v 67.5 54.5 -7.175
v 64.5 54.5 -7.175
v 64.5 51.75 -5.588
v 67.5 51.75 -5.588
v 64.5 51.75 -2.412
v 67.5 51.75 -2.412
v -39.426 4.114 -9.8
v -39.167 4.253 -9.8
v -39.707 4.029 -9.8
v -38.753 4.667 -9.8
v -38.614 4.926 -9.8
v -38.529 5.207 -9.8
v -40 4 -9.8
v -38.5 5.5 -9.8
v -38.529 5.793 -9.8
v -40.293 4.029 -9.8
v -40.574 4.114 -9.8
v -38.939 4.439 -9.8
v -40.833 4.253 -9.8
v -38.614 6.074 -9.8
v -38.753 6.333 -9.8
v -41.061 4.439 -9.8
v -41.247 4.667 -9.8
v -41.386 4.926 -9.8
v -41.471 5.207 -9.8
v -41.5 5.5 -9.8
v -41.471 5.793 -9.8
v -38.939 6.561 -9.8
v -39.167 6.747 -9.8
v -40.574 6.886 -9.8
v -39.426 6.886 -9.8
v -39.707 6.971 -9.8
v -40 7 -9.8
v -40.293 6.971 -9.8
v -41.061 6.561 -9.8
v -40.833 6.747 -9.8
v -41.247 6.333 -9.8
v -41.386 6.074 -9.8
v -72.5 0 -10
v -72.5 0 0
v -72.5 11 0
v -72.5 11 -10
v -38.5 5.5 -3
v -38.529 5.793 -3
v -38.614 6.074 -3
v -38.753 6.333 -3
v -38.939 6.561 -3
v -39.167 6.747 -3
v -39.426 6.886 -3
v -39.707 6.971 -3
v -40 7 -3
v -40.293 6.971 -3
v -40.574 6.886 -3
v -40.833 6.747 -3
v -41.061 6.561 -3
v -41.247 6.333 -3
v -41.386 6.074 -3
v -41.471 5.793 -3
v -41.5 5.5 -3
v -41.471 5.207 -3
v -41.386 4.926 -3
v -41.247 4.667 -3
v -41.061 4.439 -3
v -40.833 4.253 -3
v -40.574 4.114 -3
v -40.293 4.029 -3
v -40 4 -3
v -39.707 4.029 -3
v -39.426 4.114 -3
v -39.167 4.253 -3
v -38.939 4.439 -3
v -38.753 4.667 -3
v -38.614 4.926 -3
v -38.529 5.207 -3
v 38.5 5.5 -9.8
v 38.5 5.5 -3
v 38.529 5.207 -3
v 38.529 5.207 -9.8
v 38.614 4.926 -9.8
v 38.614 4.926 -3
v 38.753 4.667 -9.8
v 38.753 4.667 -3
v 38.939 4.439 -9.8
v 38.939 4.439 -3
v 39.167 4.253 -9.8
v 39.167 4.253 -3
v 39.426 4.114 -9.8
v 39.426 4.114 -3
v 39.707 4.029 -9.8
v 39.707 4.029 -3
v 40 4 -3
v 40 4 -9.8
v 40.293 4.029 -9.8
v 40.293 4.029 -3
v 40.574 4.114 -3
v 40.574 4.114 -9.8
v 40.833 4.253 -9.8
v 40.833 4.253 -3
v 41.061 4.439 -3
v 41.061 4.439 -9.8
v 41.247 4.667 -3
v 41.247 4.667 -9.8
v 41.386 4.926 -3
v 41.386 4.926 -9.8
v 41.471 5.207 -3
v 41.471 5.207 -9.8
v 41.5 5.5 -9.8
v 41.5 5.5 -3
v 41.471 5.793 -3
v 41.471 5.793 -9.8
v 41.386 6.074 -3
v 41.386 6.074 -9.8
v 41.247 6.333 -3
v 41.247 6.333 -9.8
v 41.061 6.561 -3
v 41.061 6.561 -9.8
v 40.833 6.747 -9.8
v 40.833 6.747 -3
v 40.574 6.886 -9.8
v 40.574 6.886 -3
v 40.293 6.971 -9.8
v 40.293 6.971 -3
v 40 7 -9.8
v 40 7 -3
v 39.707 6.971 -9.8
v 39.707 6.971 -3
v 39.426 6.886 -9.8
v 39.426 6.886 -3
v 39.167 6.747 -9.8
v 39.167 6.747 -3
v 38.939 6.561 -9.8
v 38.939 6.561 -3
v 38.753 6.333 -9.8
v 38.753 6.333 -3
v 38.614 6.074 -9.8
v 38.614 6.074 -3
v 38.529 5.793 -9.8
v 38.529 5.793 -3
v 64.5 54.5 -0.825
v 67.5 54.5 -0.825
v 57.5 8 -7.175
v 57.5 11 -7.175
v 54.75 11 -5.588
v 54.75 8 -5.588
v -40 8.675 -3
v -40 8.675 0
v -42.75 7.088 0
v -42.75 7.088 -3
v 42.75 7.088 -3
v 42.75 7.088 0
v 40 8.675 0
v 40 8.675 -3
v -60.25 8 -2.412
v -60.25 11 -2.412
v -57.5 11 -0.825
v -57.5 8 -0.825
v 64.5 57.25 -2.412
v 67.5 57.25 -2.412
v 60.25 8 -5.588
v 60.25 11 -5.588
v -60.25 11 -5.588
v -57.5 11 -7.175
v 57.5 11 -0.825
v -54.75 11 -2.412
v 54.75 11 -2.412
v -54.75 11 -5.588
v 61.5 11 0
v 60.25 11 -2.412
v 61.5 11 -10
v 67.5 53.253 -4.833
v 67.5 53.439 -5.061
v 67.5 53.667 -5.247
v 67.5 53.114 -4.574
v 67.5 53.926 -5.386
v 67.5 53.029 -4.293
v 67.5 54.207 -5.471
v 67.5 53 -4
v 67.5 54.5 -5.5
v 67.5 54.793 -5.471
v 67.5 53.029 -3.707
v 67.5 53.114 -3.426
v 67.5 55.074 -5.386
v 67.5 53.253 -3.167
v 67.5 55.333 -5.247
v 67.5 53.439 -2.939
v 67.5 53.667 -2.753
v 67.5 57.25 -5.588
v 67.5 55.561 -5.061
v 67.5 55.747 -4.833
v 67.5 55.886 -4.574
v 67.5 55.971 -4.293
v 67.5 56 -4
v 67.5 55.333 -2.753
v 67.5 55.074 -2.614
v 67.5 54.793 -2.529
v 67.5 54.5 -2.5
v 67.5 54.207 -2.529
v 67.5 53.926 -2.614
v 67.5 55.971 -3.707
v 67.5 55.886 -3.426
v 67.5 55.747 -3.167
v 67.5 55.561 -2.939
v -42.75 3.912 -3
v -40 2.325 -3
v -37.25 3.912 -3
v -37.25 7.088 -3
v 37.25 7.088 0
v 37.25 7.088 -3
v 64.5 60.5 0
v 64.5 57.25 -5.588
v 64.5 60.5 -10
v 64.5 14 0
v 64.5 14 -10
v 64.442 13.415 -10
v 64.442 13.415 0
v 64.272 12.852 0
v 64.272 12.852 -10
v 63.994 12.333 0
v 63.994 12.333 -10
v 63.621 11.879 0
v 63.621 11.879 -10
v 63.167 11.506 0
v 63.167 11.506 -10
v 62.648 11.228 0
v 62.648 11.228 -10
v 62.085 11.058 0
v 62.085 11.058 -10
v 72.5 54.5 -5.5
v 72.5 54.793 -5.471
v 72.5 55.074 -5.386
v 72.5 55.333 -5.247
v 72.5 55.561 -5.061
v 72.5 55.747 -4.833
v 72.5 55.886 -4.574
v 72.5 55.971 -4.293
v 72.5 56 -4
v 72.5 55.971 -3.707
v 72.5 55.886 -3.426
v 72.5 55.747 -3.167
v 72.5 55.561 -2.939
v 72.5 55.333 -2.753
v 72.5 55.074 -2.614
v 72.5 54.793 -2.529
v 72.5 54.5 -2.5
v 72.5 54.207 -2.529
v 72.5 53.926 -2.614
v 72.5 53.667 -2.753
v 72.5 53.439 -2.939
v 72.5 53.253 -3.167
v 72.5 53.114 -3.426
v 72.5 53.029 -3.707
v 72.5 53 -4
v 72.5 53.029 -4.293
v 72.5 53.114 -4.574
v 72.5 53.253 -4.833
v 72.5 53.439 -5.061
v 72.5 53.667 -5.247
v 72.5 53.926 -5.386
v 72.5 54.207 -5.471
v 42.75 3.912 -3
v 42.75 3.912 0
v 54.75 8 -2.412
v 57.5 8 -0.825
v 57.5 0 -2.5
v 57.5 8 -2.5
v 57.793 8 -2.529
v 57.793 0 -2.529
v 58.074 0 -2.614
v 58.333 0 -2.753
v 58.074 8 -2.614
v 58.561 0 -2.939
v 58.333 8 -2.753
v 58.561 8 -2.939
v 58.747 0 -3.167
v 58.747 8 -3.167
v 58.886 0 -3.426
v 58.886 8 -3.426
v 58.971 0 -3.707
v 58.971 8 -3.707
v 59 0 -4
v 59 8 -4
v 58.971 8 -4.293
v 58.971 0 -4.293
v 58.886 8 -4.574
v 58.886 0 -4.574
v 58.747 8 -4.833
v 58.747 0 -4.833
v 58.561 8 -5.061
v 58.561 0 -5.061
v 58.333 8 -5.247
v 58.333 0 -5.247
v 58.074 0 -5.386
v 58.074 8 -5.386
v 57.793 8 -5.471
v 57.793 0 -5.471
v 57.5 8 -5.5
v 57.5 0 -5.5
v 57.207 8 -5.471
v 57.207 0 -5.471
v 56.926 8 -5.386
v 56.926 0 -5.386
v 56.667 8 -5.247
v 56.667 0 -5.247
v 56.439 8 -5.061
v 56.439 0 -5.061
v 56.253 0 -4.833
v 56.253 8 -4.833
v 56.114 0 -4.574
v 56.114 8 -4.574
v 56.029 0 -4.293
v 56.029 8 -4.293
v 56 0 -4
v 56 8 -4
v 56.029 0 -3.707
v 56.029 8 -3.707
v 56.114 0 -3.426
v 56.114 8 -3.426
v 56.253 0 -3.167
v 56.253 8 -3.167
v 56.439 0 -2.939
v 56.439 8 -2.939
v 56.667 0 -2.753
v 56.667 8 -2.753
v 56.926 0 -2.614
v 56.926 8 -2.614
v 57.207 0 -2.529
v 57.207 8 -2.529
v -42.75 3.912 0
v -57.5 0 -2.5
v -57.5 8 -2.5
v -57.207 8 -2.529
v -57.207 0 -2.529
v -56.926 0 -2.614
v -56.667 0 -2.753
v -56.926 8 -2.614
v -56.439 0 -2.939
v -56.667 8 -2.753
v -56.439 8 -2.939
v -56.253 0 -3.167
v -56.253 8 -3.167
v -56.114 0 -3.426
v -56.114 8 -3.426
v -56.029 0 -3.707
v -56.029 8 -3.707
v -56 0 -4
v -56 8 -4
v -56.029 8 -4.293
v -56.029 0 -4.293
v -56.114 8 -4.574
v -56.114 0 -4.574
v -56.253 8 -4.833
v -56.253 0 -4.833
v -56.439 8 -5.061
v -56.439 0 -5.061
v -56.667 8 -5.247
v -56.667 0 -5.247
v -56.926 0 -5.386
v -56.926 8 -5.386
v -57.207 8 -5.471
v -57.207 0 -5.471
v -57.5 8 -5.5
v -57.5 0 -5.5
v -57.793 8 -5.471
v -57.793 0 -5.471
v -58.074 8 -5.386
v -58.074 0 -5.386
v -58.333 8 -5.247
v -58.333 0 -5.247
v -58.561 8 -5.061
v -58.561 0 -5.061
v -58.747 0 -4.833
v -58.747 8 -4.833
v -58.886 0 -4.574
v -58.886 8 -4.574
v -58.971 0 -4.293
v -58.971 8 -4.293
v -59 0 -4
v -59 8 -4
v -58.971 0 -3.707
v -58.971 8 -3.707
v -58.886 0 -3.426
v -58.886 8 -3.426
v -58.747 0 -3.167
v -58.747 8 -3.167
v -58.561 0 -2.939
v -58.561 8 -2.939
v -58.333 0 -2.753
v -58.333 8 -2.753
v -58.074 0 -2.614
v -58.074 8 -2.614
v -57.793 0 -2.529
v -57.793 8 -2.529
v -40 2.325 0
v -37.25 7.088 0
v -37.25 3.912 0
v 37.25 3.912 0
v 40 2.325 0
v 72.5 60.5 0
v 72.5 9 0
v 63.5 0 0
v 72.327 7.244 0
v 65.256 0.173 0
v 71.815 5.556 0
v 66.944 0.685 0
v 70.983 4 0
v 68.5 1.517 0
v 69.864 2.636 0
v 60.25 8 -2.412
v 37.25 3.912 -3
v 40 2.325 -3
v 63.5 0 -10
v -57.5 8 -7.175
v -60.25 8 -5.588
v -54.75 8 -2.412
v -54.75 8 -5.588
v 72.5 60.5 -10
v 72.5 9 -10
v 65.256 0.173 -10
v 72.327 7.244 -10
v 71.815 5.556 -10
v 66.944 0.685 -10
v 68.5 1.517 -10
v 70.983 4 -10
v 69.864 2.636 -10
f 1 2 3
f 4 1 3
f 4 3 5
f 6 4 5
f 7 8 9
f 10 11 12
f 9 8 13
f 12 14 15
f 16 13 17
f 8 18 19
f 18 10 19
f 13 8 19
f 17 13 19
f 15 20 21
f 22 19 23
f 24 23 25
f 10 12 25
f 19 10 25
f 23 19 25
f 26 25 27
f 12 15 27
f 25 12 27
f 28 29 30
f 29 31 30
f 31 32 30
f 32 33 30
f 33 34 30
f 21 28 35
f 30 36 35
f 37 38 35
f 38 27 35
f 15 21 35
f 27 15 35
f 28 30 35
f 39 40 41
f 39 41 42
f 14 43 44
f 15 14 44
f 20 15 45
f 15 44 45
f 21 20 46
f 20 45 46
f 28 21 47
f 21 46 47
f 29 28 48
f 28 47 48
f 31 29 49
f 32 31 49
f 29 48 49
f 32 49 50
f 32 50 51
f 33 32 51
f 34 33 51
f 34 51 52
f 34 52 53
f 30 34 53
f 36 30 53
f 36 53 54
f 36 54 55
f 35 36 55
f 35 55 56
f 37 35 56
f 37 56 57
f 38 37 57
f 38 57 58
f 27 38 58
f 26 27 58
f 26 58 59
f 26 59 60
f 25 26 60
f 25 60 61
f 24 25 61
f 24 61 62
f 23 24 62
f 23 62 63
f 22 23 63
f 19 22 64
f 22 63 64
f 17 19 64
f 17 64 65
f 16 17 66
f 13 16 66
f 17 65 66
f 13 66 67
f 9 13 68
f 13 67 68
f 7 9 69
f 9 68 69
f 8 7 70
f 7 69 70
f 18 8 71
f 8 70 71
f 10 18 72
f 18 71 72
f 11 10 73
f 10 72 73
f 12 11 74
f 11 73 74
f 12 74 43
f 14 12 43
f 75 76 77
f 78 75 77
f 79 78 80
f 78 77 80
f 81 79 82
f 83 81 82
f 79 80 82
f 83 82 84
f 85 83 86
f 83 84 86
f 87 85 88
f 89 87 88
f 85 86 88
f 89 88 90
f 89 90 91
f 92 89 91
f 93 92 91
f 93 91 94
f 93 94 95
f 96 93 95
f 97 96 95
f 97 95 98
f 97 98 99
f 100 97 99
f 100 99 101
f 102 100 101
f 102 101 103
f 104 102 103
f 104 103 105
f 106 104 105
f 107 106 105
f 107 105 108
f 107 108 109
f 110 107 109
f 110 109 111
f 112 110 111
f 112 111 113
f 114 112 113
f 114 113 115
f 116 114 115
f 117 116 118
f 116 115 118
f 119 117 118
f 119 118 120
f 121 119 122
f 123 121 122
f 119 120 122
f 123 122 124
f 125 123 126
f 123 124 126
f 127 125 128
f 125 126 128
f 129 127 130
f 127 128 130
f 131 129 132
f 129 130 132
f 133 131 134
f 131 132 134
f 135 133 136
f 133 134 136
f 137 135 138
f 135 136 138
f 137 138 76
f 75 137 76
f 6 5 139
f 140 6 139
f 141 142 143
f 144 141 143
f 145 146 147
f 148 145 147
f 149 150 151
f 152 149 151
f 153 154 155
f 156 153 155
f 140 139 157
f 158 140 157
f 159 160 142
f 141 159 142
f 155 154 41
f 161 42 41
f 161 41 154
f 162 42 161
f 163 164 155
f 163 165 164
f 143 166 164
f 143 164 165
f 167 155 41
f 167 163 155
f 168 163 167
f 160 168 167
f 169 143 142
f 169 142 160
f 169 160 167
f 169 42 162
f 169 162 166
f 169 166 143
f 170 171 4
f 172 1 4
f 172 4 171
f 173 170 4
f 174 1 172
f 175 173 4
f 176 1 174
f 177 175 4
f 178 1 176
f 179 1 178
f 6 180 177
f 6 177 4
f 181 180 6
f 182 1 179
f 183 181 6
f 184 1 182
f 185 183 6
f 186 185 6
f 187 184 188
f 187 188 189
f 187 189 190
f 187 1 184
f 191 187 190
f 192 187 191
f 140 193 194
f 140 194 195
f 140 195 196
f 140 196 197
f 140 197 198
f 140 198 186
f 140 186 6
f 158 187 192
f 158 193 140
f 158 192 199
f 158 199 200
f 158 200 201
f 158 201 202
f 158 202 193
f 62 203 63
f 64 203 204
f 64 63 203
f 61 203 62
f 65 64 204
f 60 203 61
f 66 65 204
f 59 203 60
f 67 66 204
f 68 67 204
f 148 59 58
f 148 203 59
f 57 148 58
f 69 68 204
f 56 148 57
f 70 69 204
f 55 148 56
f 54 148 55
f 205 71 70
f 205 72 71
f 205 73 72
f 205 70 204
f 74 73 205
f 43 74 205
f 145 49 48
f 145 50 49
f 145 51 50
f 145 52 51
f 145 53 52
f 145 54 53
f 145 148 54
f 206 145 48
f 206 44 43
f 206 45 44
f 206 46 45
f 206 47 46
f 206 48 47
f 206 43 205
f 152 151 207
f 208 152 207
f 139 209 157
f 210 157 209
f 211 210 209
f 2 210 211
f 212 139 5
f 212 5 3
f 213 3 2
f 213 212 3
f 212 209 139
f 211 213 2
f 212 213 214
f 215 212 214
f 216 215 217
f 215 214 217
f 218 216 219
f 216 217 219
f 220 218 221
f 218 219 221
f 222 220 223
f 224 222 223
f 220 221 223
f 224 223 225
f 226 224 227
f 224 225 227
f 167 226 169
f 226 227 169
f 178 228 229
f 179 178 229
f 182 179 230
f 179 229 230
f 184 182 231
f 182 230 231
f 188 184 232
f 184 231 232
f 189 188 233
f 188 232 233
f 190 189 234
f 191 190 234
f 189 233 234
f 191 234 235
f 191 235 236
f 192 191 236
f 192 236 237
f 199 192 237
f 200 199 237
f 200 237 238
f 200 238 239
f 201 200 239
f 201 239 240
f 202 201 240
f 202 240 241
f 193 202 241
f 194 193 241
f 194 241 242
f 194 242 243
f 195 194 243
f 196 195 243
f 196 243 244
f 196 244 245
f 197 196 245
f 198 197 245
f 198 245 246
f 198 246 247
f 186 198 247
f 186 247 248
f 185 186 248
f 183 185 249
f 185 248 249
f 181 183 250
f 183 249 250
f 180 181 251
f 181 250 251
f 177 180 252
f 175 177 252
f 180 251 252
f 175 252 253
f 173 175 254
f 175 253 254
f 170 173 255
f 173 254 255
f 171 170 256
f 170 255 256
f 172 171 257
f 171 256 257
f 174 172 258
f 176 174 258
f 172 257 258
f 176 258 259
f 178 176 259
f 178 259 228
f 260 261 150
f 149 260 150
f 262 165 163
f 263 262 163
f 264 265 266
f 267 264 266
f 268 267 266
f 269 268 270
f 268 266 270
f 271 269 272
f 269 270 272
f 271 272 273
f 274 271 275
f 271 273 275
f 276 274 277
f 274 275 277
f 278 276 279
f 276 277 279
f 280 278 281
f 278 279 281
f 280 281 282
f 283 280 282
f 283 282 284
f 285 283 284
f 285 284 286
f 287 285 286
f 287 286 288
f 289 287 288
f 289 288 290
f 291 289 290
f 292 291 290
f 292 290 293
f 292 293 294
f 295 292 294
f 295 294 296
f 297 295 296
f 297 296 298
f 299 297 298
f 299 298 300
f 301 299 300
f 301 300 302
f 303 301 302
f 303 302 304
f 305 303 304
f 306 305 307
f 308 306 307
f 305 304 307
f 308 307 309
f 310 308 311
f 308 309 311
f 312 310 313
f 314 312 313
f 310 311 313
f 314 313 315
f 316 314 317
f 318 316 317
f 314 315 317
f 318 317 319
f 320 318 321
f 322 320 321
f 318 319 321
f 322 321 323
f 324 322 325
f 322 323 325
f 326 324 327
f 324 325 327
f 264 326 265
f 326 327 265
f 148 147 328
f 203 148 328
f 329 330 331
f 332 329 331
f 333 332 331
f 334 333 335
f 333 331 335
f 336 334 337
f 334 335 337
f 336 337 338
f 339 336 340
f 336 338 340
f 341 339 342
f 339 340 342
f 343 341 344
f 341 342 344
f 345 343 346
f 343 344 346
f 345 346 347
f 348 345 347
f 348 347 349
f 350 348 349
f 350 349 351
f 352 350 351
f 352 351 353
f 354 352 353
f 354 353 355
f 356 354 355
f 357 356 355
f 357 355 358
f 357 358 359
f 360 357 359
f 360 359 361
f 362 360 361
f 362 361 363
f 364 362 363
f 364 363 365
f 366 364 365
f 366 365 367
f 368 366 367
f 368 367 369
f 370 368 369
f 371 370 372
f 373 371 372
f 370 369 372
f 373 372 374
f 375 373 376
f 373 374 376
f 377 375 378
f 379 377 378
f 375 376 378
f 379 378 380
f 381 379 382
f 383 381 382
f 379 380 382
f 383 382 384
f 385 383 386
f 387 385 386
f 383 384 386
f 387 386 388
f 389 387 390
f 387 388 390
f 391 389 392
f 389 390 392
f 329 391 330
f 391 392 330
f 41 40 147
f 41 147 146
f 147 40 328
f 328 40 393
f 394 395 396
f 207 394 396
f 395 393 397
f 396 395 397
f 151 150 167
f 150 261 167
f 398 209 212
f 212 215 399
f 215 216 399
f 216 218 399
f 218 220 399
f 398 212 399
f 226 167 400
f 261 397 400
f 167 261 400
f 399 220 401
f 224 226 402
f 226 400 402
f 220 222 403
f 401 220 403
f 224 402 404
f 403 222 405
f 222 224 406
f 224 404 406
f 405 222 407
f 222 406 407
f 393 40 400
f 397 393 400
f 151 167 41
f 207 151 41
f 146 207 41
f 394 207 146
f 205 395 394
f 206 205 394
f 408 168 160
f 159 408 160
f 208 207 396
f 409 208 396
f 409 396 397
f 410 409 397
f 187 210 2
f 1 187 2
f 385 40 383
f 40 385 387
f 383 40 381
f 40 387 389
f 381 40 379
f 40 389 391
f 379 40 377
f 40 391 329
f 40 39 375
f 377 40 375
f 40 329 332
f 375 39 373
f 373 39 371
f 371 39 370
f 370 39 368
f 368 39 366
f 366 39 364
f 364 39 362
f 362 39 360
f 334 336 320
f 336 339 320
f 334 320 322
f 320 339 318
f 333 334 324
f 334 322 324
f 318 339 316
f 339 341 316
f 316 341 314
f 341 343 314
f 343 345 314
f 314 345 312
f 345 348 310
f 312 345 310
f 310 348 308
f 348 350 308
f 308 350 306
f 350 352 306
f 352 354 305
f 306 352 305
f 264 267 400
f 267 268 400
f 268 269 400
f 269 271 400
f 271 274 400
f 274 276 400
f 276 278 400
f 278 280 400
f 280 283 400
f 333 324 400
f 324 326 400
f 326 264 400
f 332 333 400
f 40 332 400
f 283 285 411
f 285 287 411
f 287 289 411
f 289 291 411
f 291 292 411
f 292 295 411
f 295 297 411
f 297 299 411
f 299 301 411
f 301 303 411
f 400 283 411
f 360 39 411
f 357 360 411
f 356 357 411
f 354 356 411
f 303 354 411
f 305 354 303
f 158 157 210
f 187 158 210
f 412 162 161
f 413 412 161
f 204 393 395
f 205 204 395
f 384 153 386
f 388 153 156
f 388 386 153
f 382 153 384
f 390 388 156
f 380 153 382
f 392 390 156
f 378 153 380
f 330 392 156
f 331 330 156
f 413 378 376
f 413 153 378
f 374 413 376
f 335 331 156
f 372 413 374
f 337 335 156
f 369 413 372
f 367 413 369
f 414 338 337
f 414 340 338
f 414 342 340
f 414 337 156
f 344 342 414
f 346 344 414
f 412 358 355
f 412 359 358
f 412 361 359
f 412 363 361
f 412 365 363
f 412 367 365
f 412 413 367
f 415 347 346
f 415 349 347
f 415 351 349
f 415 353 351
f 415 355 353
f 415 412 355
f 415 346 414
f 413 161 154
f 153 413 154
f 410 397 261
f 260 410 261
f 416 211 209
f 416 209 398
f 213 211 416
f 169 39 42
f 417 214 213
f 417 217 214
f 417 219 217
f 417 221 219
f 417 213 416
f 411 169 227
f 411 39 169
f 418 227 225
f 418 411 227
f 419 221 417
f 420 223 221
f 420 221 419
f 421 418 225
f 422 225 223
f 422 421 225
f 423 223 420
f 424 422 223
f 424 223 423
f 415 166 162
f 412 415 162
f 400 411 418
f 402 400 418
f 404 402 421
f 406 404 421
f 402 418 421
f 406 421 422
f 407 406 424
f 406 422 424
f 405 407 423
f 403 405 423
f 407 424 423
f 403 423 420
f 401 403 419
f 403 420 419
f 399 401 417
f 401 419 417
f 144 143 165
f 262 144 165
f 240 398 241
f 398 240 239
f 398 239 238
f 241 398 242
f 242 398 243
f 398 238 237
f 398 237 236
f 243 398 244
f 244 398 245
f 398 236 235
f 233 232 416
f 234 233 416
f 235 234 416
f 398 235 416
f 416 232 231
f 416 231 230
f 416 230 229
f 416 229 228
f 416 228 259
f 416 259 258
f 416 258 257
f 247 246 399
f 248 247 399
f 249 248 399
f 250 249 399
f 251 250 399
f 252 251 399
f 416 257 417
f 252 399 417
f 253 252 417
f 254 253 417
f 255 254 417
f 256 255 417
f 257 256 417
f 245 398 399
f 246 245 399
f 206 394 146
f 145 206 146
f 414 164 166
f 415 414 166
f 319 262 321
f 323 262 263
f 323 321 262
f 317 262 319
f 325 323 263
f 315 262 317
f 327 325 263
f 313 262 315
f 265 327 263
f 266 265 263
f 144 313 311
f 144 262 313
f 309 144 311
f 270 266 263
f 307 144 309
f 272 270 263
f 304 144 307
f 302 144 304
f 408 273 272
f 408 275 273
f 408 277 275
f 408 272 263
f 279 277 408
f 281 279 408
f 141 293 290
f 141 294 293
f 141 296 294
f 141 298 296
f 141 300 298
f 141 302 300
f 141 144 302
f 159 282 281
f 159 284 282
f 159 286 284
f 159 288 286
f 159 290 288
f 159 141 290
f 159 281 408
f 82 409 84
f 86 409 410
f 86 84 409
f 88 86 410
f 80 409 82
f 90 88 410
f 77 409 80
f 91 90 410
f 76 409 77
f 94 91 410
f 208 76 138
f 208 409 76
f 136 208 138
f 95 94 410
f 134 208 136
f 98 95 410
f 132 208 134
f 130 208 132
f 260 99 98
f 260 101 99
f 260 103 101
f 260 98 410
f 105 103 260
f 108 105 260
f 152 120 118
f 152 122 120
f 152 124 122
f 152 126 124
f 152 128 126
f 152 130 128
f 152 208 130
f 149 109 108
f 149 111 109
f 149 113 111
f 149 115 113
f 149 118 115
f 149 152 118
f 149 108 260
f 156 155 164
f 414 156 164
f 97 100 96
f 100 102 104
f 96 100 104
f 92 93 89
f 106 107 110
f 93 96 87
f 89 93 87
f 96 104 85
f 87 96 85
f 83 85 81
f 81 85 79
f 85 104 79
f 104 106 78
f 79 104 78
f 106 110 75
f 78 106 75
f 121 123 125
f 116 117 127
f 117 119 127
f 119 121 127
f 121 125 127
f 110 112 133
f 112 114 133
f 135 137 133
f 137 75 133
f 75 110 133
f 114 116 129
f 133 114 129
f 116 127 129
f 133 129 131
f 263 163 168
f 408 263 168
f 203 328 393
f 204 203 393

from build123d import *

# Parameters (mm, degrees)
ESQUISSE1_W             = 145
ESQUISSE1_H             = 10
BOSS_EXTRU_1_DEPTH      = 11
ESQUISSE2_R             = 1.5
ENL_V_MAT_EXTRU_1_DEPTH = 75.008445464
ESQUISSE3_R             = 1.5
ENL_V_MAT_EXTRU_2_DEPTH = 75.008445464
ENL_V_MAT_EXTRU_3_DEPTH = 3
ENL_V_MAT_EXTRU_4_DEPTH = 3
CONG_1_R                = 9
ESQUISSE6_W             = 8
ESQUISSE6_H             = 10
BOSS_EXTRU_2_DEPTH      = 49.5
CONG_2_R                = 3
ESQUISSE7_R             = 1.5
ENL_V_MAT_EXTRU_5_DEPTH = 158.433319218
ENL_V_MAT_EXTRU_6_DEPTH = 3
BOSS_EXTRU_3_START      = -0.2
BOSS_EXTRU_3_DEPTH      = 0.2


with BuildPart() as part:
    # Esquisse1 → Boss.-Extru.1 (new body)
    with BuildSketch(Plane(origin=(0, 0, 0), x_dir=(1, 0, 0), z_dir=(0, 1, 0))):
        with Locations((0, 5)):
            Rectangle(ESQUISSE1_W, ESQUISSE1_H)
    extrude(amount=BOSS_EXTRU_1_DEPTH)

    # Esquisse2 → Enlèv. mat.-Extru.1 (cut, through all)
    with BuildSketch(Plane(origin=(0, 11, 0), x_dir=(1, 0, 0), z_dir=(0, 1, 0))):
        with Locations(Location((-57.5, 4, 0), (0, 0, 270))):
            Circle(ESQUISSE2_R)
        with Locations(Location((57.5, 4, 0), (0, 0, 270))):
            Circle(ESQUISSE2_R)
    extrude(amount=-ENL_V_MAT_EXTRU_1_DEPTH, mode=Mode.SUBTRACT)

    # Esquisse3 → Enlèv. mat.-Extru.2 (cut, through all)
    with BuildSketch(Plane.XY):
        with Locations((-40, 5.5)):
            Circle(ESQUISSE3_R)
        with Locations(Location((40, 5.5, 0), (0, 0, 180))):
            Circle(ESQUISSE3_R)
    extrude(amount=-ENL_V_MAT_EXTRU_2_DEPTH, mode=Mode.SUBTRACT)

    # Esquisse4 → Enlèv. mat.-Extru.3 (cut)
    with BuildSketch(Plane.XY):
        Polygon((-37.25, 7.08771324), (-40, 8.675426481), (-42.75, 7.08771324), (-42.75, 3.91228676), (-40, 2.324573519), (-37.25, 3.91228676), align=None)
        Polygon((42.75, 7.08771324), (40, 8.675426481), (37.25, 7.08771324), (37.25, 3.91228676), (40, 2.324573519), (42.75, 3.91228676), align=None)
    extrude(amount=-ENL_V_MAT_EXTRU_3_DEPTH, mode=Mode.SUBTRACT)

    # Esquisse5 → Enlèv. mat.-Extru.4 (cut)
    with BuildSketch(Plane(origin=(0, 11, 0), x_dir=(1, 0, 0), z_dir=(0, 1, 0))):
        Polygon((-54.75, 5.58771324), (-57.5, 7.175426481), (-60.25, 5.58771324), (-60.25, 2.41228676), (-57.5, 0.824573519), (-54.75, 2.41228676), align=None)
        Polygon((60.25, 5.58771324), (57.5, 7.175426481), (54.75, 5.58771324), (54.75, 2.41228676), (57.5, 0.824573519), (60.25, 2.41228676), align=None)
    extrude(amount=-ENL_V_MAT_EXTRU_4_DEPTH, mode=Mode.SUBTRACT)

    # Congé1
    cong_1_edges = [part.edges().sort_by_distance(p)[0] for p in [
        (72.5, 0, -5),
    ]]
    fillet(cong_1_edges, radius=CONG_1_R)

    # Esquisse6 → Boss.-Extru.2 (add)
    with BuildSketch(Plane(origin=(0, 11, 0), x_dir=(1, 0, 0), z_dir=(0, 1, 0))):
        with Locations((68.5, 5)):
            Rectangle(ESQUISSE6_W, ESQUISSE6_H)
    extrude(amount=BOSS_EXTRU_2_DEPTH)

    # Congé2
    cong_2_edges = [part.edges().sort_by_distance(p)[0] for p in [
        (64.5, 11, -5),
    ]]
    fillet(cong_2_edges, radius=CONG_2_R)

    # Esquisse7 → Enlèv. mat.-Extru.5 (cut, through all)
    with BuildSketch(Plane(origin=(72.5, 0, 0), x_dir=(0, 0, -1), z_dir=(1, 0, 0))):
        with Locations((4, 54.5)):
            Circle(ESQUISSE7_R)
    extrude(amount=-ENL_V_MAT_EXTRU_5_DEPTH, mode=Mode.SUBTRACT)

    # Esquisse8 → Enlèv. mat.-Extru.6 (cut)
    with BuildSketch(Plane.ZY.offset(-64.5)):
        Polygon((-0.824573519, 54.5), (-2.41228676, 57.25), (-5.58771324, 57.25), (-7.175426481, 54.5), (-5.58771324, 51.75), (-2.41228676, 51.75), align=None)
    extrude(amount=-ENL_V_MAT_EXTRU_6_DEPTH, mode=Mode.SUBTRACT)

    # Esquisse9 → Boss.-Extru.3 (add)
    with BuildSketch(Plane(origin=(0, 0, -10), x_dir=(-1, 0, 0), z_dir=(0, 0, -1)).offset(BOSS_EXTRU_3_START)):
        with BuildLine():
            Line((-72.5, 60.5), (-72.5, 9))
            ThreePointArc((-72.5, 9), (-69.863961031, 2.636038969), (-63.5, 0))
            Line((-63.5, 0), (72.5, 0))
            Line((72.5, 0), (72.5, 11))
            Line((72.5, 11), (-61.5, 11))
            ThreePointArc((-61.5, 11), (-63.621320344, 11.878679656), (-64.5, 14))
            Line((-64.5, 14), (-64.5, 60.5))
            Line((-64.5, 60.5), (-72.5, 60.5))
        make_face()
    extrude(amount=BOSS_EXTRU_3_DEPTH)


solid = part.part
